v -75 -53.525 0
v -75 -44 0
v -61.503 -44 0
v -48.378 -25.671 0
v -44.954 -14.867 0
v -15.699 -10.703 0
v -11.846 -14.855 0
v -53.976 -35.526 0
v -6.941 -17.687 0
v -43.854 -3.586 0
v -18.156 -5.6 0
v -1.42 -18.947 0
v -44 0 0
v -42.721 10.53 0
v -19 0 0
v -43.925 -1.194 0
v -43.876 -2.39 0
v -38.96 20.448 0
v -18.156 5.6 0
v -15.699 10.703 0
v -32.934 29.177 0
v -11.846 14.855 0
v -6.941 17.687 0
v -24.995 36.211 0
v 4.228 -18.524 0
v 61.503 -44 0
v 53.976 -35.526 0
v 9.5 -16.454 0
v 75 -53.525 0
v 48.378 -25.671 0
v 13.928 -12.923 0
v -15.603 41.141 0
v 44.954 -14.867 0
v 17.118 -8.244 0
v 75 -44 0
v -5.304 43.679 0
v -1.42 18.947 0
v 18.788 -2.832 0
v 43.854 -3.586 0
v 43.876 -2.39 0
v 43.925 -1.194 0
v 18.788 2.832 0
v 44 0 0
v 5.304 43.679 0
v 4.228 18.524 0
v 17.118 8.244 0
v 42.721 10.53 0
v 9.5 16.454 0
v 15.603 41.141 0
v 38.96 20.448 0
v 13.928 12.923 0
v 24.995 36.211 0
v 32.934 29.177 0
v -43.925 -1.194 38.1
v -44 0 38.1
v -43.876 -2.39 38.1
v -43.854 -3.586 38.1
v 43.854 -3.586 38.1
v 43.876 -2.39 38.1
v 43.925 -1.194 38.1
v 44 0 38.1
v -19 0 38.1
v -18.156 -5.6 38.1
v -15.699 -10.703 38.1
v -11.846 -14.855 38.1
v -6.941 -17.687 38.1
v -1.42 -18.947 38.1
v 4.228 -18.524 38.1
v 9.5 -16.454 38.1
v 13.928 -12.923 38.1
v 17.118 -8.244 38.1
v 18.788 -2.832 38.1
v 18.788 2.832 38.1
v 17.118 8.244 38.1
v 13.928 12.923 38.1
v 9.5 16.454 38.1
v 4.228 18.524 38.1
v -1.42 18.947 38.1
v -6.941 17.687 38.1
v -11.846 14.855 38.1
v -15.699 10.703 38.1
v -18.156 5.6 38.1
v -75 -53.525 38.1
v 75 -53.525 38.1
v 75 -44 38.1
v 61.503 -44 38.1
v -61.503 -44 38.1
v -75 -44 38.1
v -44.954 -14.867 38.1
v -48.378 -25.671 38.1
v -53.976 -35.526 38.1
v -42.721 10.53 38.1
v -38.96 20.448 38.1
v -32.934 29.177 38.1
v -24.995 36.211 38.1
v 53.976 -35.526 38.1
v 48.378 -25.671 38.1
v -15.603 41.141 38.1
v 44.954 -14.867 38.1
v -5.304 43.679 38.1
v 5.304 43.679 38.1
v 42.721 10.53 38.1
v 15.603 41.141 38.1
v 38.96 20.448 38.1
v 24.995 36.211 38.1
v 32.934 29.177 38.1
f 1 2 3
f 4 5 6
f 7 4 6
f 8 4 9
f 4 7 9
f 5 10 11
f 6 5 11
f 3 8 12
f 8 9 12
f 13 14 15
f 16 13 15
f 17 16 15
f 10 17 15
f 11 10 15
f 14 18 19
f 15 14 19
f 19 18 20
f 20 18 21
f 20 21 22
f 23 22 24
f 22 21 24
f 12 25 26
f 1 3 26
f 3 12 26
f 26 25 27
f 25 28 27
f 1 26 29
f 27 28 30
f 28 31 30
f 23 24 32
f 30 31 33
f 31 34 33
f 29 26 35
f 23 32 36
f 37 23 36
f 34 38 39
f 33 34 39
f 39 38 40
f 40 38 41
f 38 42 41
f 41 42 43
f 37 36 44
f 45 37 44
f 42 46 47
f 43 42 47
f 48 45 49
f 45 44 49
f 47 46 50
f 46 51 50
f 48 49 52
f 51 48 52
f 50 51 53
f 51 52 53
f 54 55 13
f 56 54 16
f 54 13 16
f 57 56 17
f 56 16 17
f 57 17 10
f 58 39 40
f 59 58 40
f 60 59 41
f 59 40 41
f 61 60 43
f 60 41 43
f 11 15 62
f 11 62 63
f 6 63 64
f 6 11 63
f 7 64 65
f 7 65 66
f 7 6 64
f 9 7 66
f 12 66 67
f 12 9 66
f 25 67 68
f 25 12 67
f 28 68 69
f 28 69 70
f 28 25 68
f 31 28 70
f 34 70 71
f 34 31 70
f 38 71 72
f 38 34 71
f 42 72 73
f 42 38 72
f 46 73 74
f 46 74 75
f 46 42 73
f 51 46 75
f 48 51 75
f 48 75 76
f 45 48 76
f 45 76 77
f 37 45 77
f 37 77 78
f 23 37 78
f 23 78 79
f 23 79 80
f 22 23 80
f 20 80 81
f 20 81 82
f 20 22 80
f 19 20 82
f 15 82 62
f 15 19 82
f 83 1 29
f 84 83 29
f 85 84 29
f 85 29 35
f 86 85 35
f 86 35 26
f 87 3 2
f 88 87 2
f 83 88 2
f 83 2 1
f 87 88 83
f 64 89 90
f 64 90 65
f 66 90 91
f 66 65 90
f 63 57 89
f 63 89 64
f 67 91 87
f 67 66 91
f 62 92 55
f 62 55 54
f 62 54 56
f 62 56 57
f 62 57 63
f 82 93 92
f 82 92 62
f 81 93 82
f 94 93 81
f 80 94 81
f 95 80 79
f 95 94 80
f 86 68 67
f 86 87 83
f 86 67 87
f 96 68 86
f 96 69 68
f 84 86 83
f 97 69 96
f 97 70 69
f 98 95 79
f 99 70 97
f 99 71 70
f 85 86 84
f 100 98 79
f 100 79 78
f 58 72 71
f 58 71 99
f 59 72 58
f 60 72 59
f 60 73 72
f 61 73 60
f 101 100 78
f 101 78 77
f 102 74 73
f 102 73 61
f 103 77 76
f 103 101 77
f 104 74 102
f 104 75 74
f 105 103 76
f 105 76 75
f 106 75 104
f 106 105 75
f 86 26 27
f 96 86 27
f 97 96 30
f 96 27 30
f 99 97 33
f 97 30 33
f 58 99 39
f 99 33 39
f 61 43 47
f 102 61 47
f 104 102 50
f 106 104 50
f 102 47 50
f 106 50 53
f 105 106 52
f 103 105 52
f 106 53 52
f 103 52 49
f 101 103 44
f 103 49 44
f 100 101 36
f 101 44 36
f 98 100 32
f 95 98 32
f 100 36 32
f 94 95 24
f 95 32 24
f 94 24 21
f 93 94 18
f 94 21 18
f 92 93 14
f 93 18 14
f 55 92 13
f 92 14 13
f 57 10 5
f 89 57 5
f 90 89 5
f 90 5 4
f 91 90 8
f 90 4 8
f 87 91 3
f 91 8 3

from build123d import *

# Parameters (mm, degrees)
CROQUIS1_R              = 19
SALIENTE_EXTRUIR1_DEPTH = 38.1


with BuildPart() as part:
    # Croquis1 → Saliente-Extruir1 (new body)
    with BuildSketch(Plane.XY):
        with BuildLine():
            Line((-61.503424818, -44), (-75, -44))
            Line((-75, -44), (-75, -53.525))
            Line((-75, -53.525), (75, -53.525))
            Line((75, -53.525), (75, -44))
            Line((75, -44), (61.503424818, -44))
            ThreePointArc((61.503424818, -44), (48.377816196, -25.671153051), (43.853638254, -3.585862786))
            ThreePointArc((43.853638254, -3.585862786), (43.897102733, -1.791718479), (44, 0))
            ThreePointArc((44, 0), (0, 44), (-44, 0))
            ThreePointArc((-44, 0), (-43.897102733, -1.791718479), (-43.853638254, -3.585862786))
            ThreePointArc((-43.853638254, -3.585862786), (-48.377816196, -25.671153051), (-61.503424818, -44))
        make_face()
        with Locations(Location((0, 0, 0), (0, 0, 180))):
            Circle(CROQUIS1_R, mode=Mode.SUBTRACT)
    extrude(amount=SALIENTE_EXTRUIR1_DEPTH)


solid = part.part
